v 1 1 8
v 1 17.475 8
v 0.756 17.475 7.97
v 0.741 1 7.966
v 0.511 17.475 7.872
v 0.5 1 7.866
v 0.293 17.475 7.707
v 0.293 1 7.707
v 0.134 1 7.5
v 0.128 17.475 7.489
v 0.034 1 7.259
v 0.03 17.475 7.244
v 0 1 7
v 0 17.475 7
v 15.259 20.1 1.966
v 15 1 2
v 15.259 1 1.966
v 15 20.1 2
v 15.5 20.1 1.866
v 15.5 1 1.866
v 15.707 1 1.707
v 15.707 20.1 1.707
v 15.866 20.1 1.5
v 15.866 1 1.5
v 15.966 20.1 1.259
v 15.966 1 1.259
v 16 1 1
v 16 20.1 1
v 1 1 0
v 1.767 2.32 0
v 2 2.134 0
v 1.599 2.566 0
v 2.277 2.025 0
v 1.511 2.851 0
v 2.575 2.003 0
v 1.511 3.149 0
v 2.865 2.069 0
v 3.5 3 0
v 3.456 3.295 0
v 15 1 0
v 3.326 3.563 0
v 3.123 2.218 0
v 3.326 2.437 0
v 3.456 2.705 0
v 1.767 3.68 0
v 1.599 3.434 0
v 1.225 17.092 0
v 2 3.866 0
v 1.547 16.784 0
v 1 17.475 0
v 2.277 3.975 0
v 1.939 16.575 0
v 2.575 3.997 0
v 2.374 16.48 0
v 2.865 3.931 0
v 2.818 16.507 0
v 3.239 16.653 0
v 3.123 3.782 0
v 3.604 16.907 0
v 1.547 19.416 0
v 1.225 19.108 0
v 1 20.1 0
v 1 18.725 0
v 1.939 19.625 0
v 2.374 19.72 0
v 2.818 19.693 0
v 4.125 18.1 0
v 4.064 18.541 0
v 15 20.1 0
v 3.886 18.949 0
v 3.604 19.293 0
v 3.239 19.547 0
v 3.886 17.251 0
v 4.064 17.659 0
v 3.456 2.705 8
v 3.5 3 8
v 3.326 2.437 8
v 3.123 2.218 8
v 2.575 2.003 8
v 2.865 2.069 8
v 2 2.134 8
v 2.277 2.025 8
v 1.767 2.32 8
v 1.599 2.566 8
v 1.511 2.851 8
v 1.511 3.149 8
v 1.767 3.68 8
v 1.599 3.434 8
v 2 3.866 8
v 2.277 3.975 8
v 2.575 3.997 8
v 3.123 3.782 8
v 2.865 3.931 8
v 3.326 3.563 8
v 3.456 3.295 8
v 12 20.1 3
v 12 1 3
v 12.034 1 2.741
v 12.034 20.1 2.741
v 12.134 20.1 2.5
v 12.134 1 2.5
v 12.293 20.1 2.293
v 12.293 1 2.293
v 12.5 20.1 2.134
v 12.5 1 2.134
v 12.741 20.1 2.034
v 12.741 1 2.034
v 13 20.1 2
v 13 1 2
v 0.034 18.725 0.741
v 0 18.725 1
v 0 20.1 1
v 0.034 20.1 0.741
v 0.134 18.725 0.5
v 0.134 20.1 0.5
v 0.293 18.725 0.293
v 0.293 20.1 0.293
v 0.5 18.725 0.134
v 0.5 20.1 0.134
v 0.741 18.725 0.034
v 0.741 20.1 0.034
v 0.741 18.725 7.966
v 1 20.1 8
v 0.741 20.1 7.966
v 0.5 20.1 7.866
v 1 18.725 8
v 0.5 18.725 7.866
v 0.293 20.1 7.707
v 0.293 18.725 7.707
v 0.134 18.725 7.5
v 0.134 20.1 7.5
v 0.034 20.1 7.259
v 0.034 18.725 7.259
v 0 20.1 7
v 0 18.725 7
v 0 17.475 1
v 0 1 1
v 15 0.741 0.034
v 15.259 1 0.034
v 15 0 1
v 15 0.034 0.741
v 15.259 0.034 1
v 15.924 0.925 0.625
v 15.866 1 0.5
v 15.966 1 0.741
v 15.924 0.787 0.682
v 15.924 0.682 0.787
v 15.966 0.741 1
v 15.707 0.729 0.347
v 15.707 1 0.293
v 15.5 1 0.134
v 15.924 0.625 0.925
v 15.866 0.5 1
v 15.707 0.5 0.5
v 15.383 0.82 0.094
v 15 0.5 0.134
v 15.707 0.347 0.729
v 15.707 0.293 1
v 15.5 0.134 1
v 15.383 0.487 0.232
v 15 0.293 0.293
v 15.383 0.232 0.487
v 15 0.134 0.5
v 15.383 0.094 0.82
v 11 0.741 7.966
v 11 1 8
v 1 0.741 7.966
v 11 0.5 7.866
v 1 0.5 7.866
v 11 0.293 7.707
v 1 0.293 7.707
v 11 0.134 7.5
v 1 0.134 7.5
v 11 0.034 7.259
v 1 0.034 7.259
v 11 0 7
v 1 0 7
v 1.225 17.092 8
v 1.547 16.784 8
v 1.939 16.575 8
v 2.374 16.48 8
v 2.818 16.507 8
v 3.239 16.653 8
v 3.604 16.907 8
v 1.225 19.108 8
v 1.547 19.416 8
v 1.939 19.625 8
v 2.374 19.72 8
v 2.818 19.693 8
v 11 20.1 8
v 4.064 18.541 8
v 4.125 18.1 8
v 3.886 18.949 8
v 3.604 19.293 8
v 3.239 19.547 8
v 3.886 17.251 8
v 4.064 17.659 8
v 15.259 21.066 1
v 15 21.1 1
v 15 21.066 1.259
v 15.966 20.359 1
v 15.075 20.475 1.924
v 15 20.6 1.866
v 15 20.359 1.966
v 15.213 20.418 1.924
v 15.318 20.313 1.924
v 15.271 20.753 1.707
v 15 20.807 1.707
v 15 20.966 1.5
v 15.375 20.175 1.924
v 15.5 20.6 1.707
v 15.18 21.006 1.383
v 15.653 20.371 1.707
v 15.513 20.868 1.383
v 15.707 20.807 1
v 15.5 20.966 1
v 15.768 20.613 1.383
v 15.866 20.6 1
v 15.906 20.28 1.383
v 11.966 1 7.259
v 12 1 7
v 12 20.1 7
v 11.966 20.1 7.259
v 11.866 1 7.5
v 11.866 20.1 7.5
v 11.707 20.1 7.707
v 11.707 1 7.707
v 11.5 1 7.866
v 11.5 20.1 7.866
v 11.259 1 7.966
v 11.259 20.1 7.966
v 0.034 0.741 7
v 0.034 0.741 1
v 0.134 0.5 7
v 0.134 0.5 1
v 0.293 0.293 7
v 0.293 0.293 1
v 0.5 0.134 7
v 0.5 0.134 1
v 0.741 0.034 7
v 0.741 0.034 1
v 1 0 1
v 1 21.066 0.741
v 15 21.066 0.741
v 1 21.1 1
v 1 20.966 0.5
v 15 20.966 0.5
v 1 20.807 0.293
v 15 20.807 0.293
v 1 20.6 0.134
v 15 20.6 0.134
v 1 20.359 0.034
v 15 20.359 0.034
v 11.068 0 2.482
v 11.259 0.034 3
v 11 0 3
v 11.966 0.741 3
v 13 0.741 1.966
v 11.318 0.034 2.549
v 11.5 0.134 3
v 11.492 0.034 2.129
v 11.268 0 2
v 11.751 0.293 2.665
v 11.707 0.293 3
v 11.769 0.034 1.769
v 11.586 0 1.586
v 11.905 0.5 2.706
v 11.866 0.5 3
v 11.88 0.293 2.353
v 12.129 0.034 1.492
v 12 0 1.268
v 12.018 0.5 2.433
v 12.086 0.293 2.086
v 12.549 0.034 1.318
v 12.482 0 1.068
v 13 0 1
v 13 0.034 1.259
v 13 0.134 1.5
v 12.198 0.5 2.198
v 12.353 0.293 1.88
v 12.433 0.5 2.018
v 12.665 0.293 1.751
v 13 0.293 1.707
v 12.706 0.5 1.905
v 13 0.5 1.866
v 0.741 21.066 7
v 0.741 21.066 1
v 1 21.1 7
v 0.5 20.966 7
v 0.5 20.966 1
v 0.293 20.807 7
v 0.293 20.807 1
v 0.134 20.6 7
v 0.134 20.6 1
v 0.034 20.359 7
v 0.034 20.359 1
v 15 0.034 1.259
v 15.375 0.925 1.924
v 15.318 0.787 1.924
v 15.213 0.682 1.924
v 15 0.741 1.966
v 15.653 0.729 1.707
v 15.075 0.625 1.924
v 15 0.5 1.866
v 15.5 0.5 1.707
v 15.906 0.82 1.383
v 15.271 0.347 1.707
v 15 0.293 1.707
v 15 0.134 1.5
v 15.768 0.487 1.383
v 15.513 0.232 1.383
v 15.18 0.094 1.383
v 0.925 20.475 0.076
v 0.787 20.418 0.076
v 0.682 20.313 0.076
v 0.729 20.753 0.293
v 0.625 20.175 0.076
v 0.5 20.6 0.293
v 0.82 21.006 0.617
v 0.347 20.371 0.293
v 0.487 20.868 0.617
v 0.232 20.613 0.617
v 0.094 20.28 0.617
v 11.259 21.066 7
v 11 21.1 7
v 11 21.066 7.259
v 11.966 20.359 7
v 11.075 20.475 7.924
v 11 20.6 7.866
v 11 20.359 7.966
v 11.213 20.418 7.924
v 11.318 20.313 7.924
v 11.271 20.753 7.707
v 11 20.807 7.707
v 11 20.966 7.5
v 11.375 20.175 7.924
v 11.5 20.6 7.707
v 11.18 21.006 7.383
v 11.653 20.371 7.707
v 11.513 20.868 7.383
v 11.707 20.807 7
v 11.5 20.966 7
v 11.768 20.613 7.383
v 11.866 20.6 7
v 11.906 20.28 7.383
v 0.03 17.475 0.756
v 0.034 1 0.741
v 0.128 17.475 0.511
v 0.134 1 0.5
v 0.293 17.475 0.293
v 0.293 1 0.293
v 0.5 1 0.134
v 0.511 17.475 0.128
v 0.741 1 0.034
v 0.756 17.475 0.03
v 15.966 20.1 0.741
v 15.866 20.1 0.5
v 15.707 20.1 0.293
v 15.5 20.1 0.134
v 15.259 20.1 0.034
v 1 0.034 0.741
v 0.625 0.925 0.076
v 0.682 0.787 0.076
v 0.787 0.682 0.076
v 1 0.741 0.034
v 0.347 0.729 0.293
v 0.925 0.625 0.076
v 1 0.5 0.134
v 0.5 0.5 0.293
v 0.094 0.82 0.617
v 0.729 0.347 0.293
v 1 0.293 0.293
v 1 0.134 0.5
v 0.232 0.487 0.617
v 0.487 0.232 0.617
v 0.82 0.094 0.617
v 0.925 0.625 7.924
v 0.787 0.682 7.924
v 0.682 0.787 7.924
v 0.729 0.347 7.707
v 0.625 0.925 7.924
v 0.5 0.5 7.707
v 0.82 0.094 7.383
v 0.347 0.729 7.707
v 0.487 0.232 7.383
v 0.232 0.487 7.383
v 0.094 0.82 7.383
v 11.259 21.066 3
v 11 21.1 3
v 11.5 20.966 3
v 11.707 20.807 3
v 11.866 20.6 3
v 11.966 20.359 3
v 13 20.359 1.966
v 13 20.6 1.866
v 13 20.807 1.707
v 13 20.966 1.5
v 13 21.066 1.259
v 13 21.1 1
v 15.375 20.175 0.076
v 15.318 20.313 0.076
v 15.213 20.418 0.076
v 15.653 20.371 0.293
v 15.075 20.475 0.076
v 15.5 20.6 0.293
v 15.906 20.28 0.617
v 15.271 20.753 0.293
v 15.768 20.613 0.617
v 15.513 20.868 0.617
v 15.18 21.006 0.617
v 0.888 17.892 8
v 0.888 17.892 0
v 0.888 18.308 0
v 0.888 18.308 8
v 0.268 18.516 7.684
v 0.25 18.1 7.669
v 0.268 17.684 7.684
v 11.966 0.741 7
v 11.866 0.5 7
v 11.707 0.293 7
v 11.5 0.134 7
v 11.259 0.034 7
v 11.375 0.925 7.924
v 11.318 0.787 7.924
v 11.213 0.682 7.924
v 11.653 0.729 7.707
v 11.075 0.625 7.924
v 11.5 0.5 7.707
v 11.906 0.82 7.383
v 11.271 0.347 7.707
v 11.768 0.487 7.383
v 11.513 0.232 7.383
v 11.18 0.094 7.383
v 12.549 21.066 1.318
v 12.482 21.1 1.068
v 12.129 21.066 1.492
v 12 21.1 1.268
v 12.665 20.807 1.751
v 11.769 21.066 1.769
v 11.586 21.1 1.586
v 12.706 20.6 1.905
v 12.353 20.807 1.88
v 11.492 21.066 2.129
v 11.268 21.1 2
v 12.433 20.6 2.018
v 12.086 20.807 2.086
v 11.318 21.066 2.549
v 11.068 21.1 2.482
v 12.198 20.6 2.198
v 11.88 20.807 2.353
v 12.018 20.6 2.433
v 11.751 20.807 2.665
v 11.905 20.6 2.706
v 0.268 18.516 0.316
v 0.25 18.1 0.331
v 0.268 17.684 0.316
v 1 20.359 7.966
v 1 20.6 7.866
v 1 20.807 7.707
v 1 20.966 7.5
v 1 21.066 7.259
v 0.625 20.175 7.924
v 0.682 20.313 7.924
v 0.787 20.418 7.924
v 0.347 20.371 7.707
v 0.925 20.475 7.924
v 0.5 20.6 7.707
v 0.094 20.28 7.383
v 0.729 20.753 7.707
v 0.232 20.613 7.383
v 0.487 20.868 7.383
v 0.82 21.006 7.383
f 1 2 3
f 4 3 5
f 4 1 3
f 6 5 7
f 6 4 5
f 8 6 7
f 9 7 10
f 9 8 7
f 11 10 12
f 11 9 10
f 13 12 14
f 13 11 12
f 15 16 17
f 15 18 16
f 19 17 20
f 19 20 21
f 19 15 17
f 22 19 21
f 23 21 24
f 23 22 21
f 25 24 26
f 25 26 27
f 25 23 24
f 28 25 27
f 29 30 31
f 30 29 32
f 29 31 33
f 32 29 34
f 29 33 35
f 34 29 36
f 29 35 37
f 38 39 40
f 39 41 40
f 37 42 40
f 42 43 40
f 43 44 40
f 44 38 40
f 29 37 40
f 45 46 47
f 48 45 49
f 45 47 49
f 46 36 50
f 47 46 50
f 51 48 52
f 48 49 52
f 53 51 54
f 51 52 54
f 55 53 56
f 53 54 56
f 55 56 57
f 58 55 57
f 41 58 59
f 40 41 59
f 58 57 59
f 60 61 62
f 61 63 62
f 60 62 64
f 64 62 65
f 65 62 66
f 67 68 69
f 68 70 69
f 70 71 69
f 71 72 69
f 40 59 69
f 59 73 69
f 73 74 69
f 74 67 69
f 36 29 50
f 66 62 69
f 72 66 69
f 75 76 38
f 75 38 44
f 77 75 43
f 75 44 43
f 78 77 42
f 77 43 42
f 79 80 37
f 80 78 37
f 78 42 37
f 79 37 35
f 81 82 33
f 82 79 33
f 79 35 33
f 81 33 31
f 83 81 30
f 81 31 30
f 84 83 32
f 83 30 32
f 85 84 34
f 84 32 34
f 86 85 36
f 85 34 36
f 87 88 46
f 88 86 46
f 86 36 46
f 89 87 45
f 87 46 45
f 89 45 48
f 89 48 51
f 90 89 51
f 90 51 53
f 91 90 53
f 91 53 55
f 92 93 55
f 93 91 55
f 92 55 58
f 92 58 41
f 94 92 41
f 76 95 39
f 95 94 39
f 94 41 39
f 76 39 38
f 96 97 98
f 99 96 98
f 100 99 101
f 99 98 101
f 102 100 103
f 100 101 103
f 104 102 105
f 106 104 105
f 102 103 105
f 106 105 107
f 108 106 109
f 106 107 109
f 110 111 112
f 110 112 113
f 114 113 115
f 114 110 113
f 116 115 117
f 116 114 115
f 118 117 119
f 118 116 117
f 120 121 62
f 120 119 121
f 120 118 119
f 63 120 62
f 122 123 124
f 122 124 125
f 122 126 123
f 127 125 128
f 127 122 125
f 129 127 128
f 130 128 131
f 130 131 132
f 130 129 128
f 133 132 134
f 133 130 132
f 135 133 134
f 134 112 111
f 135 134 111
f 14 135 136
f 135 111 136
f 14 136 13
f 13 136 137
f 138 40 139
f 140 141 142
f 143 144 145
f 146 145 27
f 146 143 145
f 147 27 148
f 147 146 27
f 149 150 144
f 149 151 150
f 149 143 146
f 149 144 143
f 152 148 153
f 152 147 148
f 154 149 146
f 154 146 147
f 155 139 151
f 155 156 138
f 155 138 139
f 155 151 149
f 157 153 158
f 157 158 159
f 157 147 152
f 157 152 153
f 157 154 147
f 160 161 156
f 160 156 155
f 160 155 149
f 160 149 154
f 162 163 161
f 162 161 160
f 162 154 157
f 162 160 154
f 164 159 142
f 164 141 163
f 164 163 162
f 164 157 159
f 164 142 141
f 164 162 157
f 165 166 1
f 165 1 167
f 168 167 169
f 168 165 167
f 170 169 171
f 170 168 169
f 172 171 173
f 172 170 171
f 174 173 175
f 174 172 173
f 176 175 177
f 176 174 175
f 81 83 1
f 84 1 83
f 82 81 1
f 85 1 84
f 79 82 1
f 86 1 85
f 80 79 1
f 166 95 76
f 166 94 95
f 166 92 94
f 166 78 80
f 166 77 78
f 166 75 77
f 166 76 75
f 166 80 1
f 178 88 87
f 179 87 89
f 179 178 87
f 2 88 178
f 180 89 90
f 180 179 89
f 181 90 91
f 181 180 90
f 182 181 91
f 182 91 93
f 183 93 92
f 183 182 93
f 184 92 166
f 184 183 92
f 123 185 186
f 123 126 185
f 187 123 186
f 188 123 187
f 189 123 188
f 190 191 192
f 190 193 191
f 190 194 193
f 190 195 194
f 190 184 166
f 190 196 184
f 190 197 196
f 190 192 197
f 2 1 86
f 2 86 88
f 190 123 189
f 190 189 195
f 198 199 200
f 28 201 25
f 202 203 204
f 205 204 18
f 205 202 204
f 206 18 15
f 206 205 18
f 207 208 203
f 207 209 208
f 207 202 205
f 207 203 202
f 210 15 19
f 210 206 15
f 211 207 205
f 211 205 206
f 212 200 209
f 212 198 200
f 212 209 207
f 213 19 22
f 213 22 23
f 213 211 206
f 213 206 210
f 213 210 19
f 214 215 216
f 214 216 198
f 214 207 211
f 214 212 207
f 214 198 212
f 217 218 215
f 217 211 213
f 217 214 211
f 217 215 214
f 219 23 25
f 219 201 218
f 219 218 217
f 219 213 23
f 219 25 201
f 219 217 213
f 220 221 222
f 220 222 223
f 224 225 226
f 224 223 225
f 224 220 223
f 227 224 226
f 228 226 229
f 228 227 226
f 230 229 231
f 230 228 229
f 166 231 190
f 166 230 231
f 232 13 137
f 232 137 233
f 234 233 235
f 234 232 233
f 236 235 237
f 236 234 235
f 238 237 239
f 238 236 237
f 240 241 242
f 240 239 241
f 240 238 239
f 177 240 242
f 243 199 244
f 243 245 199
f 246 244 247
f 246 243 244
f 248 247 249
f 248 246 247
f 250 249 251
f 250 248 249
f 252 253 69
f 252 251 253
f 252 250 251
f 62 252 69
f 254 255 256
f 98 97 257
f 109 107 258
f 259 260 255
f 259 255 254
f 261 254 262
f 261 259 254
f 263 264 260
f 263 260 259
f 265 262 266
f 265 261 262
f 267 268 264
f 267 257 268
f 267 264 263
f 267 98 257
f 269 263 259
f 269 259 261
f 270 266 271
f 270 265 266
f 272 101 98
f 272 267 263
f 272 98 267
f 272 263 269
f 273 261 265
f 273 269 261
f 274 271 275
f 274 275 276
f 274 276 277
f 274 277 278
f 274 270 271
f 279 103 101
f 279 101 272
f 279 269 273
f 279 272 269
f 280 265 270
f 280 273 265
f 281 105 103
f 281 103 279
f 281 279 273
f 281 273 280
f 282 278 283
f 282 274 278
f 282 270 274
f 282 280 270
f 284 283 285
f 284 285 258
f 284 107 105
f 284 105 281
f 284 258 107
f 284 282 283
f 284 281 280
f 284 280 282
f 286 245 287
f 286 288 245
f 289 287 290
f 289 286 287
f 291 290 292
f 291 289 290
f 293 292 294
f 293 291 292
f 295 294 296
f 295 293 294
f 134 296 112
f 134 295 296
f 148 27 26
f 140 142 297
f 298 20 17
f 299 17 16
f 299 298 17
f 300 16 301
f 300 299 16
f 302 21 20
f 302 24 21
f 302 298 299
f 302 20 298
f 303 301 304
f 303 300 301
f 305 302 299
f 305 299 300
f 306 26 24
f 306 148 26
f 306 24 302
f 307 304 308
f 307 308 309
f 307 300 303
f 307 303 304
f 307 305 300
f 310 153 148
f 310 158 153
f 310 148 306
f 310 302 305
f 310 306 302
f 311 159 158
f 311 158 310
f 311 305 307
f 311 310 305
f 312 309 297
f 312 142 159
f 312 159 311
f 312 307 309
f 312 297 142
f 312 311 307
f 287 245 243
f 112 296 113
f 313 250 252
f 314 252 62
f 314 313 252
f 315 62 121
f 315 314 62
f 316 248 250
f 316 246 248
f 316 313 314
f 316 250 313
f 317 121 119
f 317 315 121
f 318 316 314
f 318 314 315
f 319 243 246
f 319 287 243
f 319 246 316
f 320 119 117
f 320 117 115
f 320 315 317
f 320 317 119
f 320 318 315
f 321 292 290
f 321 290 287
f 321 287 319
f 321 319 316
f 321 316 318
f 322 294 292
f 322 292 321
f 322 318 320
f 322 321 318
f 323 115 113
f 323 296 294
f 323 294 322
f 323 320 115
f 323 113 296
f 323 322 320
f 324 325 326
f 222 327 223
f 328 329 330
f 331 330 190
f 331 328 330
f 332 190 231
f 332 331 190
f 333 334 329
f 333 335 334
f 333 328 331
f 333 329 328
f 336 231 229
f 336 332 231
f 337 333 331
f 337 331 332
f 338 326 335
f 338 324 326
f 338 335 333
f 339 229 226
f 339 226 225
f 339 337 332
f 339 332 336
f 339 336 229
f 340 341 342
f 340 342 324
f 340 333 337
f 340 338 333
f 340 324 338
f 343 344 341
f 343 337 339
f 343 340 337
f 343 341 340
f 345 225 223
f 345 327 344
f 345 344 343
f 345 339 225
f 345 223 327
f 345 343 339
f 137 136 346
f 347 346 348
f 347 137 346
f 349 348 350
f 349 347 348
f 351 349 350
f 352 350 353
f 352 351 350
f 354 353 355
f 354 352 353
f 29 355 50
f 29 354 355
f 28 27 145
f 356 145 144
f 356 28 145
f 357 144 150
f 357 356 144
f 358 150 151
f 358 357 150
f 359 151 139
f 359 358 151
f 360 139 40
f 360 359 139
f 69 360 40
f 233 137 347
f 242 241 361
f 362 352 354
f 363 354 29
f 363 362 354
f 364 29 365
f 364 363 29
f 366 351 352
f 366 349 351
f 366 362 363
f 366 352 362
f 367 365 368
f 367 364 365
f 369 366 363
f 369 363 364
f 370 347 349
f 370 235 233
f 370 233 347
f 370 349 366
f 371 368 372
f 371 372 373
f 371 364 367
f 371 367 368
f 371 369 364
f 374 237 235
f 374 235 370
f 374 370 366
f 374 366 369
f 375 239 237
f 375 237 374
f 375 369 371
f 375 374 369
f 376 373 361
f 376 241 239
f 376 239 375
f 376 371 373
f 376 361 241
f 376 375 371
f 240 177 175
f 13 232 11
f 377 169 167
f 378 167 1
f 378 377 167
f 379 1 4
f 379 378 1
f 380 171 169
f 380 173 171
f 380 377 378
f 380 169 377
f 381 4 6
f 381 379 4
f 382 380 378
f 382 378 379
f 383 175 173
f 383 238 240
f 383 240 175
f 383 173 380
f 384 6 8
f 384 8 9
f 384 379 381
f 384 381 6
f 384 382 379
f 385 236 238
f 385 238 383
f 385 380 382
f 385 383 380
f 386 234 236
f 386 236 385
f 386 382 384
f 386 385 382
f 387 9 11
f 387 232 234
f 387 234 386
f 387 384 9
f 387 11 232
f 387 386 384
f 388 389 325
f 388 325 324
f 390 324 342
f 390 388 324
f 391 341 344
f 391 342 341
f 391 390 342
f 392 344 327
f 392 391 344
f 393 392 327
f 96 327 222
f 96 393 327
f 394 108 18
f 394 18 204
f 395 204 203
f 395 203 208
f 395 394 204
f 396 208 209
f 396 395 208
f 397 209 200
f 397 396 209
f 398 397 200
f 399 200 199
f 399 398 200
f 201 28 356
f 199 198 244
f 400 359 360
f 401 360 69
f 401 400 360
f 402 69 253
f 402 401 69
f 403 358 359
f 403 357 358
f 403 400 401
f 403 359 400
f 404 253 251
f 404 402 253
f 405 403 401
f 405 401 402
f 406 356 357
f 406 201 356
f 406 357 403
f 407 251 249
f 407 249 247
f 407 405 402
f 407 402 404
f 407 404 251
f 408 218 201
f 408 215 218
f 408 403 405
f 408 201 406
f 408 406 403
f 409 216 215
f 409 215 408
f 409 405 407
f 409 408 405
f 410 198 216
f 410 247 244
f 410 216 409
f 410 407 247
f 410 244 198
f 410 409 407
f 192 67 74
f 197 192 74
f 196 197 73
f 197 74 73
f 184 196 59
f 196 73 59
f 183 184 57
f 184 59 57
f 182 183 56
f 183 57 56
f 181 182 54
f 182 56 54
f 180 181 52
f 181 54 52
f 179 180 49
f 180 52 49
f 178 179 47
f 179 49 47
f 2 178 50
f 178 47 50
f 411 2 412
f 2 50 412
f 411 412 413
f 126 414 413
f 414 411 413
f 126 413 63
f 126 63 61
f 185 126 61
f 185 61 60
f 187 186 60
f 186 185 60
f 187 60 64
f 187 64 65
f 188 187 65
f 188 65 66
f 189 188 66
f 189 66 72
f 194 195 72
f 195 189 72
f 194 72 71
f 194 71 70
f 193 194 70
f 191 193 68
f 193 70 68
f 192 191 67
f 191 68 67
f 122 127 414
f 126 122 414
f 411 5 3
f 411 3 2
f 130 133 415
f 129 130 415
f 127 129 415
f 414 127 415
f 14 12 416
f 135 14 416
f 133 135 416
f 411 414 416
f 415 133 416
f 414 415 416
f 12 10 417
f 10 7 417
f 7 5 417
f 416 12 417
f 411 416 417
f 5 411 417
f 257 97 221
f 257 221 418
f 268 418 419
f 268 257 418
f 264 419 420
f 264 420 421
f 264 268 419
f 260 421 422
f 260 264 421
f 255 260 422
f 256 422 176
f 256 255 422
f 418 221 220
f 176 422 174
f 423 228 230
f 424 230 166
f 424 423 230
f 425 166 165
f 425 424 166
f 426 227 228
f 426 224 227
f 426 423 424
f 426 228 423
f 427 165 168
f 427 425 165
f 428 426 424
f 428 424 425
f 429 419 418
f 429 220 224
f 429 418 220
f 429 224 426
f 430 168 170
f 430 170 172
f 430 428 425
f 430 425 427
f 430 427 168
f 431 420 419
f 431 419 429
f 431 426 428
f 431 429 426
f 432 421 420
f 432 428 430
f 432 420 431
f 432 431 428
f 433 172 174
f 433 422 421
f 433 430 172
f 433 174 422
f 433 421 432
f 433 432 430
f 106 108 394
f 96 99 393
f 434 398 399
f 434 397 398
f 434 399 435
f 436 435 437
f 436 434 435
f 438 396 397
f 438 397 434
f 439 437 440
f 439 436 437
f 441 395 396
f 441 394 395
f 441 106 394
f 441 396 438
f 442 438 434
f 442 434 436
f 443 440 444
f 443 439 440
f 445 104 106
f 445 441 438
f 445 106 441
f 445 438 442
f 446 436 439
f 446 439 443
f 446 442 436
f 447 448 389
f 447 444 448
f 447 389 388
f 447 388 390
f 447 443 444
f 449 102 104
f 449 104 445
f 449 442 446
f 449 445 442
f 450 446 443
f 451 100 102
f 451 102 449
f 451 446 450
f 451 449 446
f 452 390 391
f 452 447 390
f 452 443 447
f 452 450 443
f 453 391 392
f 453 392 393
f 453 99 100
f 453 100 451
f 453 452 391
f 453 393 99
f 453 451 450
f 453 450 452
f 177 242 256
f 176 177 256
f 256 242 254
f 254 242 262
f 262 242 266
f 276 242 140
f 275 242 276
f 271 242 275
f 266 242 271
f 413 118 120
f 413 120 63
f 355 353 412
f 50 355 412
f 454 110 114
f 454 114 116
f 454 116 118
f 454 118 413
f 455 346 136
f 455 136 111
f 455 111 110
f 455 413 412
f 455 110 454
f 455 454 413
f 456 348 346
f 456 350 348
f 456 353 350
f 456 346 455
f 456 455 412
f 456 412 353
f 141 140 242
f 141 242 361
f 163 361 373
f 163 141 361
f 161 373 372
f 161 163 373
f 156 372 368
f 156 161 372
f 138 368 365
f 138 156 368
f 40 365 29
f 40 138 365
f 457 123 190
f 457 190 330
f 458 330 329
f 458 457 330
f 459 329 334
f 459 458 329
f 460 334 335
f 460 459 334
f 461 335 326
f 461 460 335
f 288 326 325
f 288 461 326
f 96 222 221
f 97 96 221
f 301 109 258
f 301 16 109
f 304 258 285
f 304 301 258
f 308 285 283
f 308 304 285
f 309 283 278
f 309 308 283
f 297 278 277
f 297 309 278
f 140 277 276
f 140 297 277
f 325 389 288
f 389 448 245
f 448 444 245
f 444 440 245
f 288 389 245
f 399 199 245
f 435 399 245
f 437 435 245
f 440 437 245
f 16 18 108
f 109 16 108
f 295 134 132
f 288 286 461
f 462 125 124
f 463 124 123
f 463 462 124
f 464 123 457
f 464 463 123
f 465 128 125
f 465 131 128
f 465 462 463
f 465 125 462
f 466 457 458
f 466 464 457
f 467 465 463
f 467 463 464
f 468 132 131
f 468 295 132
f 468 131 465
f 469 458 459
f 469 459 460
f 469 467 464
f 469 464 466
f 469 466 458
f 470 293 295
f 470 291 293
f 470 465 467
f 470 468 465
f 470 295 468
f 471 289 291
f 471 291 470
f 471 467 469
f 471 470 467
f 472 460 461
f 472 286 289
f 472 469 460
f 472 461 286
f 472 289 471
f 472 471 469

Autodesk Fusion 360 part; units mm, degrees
sketch "Main Body" plane through (0, 0, 0) normal (0, 0, 1) x (1, 0, 0)
  line L0 (0, 0) -> (16, 0)
  line L1 (16, 0) -> (16, 21.1)
  line L2 (16, 21.1) -> (0, 21.1)
  line L3 (0, 21.1) -> (0, 0)
  circle A0 centre (2.5, 18.1) radius 1.625
  line L4 (0, 10.55) -> (16, 10.55) construction
  circle A1 centre (2.5, 3) radius 1
  dimension "d1" = 16
  dimension "d2" = 21.1
  dimension "d3" = 3.25
  dimension "d4" = 3
  dimension "d5" = 2.5
  dimension "d6" = 10.55
  dimension "d11" = 2
  dimension "d12" = 2.5
  dimension "d13" = 3
extrude "Extrude1" add sketch "Main Body" along normal blind 8
sketch "step_cut" plane through (0, 0, 8) normal (0, 0, 1) x (-1, 0, 0)
  circle A0 centre (-2.5, -3) radius 1
  circle A1 centre (-2.5, -18.1) radius 1.625
  line L0 (0, -21.1) -> (0, 0)
  line L1 (0, 0) -> (-16, 0)
  line L2 (-16, 0) -> (-16, -21.1)
  line L3 (-16, -21.1) -> (0, -21.1)
  line L4 (-16, -21.1) -> (-12, -21.1)
  line L5 (-12, -21.1) -> (-12, 0)
  line L6 (-12, 0) -> (-16, 0)
  line L7 (-16, 0) -> (-16, -21.1)
extrude "Extrude2" cut sketch "step_cut" against normal blind 6 contours L1 L2 L3 L4 L5 L6 L7
fillet "Fillet1" radius 1 13 edges at (12, 10.55, 2) (12, 0, 5) (12, 21.1, 5) (0, 0, 4) (8, 0, 0) (16, 0, 1) (16, 21.1, 1) (16, 10.55, 0) (16, 10.55, 2) (14, 0, 2) (14, 21.1, 2) (12, 10.55, 8) (6, 0, 8) 2 faces at (0, 14.0667, 2.6667) (4, 21.1, 3.3333)
